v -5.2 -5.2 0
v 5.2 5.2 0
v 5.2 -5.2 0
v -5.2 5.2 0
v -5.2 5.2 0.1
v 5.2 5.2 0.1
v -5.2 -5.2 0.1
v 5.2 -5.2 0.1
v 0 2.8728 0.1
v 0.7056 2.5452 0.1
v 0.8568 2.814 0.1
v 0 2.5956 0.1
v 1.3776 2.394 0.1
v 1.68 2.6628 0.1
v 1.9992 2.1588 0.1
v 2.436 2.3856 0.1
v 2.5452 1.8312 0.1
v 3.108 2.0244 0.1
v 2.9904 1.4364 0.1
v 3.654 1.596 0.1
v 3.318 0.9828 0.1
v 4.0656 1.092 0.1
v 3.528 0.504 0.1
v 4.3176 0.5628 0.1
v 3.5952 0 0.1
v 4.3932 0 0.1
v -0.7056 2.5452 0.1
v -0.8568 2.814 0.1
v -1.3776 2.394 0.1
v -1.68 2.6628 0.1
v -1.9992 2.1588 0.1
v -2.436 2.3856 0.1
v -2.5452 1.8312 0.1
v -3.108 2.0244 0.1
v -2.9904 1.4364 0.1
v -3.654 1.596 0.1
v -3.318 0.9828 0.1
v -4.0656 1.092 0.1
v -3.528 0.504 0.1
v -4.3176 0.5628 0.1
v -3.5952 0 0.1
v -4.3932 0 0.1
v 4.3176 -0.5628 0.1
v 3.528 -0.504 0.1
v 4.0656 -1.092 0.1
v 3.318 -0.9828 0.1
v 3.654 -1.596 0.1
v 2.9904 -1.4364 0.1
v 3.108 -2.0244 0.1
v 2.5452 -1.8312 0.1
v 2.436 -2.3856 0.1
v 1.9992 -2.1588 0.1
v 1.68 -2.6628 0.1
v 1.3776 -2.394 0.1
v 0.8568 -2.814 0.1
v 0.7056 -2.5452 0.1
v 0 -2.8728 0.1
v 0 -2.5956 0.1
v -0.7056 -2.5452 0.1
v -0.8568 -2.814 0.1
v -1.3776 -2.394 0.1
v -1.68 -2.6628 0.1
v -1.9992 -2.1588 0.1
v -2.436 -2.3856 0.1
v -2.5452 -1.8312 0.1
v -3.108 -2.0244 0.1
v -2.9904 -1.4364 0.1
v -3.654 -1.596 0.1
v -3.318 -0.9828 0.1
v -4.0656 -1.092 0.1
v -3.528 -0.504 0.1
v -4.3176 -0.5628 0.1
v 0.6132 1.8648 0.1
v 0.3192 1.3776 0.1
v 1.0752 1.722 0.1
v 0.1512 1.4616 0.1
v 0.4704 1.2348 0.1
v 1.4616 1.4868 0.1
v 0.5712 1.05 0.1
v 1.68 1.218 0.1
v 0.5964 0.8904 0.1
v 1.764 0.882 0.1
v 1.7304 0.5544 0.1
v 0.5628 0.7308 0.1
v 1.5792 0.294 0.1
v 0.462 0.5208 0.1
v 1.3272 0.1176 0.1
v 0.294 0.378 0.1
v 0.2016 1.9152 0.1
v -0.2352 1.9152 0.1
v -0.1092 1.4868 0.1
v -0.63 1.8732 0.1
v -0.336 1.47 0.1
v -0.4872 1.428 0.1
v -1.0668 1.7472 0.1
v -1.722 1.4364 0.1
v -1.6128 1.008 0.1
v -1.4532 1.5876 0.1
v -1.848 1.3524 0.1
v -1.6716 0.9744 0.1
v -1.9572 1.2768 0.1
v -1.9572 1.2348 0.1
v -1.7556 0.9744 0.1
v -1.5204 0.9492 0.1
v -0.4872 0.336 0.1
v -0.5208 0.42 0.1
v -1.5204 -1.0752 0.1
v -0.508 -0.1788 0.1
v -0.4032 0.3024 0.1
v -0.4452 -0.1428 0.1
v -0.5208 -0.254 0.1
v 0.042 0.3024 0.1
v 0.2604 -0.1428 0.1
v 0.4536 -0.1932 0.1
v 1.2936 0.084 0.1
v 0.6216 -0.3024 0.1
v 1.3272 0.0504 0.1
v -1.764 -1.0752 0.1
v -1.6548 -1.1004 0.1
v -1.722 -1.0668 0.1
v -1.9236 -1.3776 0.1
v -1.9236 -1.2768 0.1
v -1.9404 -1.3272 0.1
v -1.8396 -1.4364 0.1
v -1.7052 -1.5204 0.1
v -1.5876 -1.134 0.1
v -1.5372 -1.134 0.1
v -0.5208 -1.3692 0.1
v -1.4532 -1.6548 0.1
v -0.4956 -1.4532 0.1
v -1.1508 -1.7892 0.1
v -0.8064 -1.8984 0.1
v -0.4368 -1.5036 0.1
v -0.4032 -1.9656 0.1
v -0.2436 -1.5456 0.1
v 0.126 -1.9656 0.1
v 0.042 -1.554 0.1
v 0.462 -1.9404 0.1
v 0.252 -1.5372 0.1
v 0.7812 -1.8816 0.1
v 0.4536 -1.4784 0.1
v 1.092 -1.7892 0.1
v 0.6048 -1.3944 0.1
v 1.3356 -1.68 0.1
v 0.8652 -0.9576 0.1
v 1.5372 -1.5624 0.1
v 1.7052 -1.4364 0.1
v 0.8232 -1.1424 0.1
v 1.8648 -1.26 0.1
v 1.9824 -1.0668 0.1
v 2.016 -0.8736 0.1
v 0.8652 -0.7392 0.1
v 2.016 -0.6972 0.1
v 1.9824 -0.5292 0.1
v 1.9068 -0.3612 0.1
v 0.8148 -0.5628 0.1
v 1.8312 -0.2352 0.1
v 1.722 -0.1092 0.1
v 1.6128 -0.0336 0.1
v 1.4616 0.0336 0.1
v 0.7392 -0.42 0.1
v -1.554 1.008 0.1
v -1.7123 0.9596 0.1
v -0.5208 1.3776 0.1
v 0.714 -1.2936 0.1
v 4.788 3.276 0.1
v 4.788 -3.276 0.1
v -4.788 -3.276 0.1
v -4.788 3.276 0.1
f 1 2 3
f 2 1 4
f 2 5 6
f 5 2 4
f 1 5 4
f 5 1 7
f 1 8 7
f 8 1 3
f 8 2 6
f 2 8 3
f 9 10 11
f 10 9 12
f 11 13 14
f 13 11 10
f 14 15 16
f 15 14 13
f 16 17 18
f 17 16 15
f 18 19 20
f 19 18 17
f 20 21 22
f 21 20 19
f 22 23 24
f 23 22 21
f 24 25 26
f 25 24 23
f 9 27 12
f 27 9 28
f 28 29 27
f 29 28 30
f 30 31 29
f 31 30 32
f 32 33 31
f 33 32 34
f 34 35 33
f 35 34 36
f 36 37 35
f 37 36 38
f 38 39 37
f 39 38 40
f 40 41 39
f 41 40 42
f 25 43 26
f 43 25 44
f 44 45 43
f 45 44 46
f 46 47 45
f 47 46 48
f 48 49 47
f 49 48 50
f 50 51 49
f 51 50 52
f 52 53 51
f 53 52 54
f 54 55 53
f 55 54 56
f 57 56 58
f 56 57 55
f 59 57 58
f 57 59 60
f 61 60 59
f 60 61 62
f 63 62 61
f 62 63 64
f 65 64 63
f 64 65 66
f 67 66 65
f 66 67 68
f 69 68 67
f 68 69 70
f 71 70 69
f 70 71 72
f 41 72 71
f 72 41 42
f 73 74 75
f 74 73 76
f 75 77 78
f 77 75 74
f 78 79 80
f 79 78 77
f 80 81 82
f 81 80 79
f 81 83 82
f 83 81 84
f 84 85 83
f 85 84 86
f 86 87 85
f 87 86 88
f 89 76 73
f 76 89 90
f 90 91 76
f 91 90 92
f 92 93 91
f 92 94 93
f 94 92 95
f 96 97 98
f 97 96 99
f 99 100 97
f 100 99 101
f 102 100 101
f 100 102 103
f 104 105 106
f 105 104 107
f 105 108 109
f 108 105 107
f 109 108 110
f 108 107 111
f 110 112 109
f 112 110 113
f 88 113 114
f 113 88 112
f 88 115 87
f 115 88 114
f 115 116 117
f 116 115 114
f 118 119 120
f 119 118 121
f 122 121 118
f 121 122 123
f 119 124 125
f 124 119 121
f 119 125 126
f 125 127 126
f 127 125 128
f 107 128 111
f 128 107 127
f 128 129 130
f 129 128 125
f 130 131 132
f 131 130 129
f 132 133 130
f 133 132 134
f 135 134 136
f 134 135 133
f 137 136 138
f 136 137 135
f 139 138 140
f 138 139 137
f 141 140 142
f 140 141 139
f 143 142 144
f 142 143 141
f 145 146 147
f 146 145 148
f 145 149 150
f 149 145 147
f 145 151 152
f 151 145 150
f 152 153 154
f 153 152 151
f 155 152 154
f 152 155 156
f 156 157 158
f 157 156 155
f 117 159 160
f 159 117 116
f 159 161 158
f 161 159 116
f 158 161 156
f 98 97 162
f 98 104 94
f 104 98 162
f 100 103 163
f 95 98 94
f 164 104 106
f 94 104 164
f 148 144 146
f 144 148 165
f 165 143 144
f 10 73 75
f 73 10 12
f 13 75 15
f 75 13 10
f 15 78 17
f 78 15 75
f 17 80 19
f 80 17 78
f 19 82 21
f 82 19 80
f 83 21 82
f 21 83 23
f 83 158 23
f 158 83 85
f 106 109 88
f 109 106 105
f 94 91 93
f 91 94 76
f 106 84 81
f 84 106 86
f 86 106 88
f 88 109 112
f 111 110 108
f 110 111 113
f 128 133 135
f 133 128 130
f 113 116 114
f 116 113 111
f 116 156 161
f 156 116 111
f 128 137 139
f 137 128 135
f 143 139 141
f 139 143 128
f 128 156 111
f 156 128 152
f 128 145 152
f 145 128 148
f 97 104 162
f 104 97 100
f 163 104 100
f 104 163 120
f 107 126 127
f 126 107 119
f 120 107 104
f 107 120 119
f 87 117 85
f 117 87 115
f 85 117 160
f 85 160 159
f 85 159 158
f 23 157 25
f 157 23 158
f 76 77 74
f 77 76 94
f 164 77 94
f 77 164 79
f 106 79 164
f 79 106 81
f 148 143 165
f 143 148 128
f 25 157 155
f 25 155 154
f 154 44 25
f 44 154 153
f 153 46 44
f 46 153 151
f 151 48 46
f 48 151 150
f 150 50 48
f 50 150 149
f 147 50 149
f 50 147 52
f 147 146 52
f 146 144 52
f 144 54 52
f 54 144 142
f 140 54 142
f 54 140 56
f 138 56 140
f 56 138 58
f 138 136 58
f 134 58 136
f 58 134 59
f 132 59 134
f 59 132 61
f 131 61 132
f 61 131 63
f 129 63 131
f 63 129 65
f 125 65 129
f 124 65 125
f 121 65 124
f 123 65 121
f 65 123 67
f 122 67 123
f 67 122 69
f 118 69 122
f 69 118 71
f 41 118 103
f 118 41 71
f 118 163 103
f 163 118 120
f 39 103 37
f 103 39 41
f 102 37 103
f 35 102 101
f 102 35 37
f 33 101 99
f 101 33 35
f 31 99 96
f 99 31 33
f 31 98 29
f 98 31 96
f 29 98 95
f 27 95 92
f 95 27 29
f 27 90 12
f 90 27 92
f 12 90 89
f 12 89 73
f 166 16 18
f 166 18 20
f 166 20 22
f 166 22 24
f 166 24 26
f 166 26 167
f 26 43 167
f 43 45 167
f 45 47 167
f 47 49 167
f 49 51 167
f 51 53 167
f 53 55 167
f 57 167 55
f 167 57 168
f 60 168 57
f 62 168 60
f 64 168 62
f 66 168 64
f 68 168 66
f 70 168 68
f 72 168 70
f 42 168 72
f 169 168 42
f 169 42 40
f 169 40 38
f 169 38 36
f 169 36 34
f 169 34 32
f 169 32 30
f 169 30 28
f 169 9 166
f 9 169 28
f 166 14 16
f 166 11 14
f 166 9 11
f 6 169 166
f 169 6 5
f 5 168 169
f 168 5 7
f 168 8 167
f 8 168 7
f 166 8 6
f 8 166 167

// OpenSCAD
use <../lib.scad>
use <../p/box5-12.scad>
use <s/191915sbe.scad>
$fa=1; $fs=0.2;
function ldraw_lib__004757b(realsolid=false) = [
// 0 Sticker  1.3 x  1.3 with White Belgian Railways Logo ("B")
// 0 Name: 004757b.dat
// 0 Author: Takeshi Takahashi [RainbowDolphin]
// 0 !LDRAW_ORG Part UPDATE 2022-05
// 0 !LICENSE Licensed under CC BY 2.0 and CC BY 4.0 : see CAreadme.txt
// 
// 0 BFC CERTIFY CCW
  [0,"BFC","CERTIFY"],
  [0,"BFC","CCW"],
// 
// 0 !KEYWORDS Caboose, Passenger wagon, Set 164-1, Train
// 
// 0 !HISTORY 2020-01-07 [Plastikean] Original TEXMAP pattern for OMR
// 0 !HISTORY 2021-03-31 [RainbowDolphin] File preparation for LDraw Parts Tracker, vectorized the pattern
// 0 !HISTORY 2022-09-15 [PTadmin] Official Update 2022-05
// 
// 
// 1 16 0 -0.25 0 13 0 0 0 0.25 0 0 0 13 box5-12.dat
  [1,16,0,-0.25,0,13,0,0,0,0.25,0,0,0,13, ldraw_lib__box5_12(realsolid)],
// 1 4 0 -0.25 0 0.21 0 0 0 1 0 0 0 0.21 s\191915sbe.dat
  [1,4,0,-0.25,0,0.21,0,0,0,1,0,0,0,0.21, ldraw_lib__s__191915sbe(realsolid)],
// 4 4 13 -0.25 13 -13 -0.25 13 -11.97 -0.25 8.19 11.97 -0.25 8.19
  [4,4,13,-0.25,13,-13,-0.25,13,-11.97,-0.25,8.19,11.97,-0.25,8.19],
// 4 4 -11.97 -0.25 -8.19 -11.97 -0.25 8.19 -13 -0.25 13 -13 -0.25 -13
  [4,4,-11.97,-0.25,-8.19,-11.97,-0.25,8.19,-13,-0.25,13,-13,-0.25,-13],
// 4 4 11.97 -0.25 -8.19 -11.97 -0.25 -8.19 -13 -0.25 -13 13 -0.25 -13
  [4,4,11.97,-0.25,-8.19,-11.97,-0.25,-8.19,-13,-0.25,-13,13,-0.25,-13],
// 4 4 11.97 -0.25 8.19 11.97 -0.25 -8.19 13 -0.25 -13 13 -0.25 13
  [4,4,11.97,-0.25,8.19,11.97,-0.25,-8.19,13,-0.25,-13,13,-0.25,13],
];
module ldraw_lib__004757b(step=0, col=false, unit=2/5, alt=false, line=0.2, solid=!$preview)
    makepoly(ldraw_lib__004757b(solid), step=step, col=col, unit=unit, alt=alt, line=line, solid=solid);
ldraw_lib__004757b(line=0.2);
